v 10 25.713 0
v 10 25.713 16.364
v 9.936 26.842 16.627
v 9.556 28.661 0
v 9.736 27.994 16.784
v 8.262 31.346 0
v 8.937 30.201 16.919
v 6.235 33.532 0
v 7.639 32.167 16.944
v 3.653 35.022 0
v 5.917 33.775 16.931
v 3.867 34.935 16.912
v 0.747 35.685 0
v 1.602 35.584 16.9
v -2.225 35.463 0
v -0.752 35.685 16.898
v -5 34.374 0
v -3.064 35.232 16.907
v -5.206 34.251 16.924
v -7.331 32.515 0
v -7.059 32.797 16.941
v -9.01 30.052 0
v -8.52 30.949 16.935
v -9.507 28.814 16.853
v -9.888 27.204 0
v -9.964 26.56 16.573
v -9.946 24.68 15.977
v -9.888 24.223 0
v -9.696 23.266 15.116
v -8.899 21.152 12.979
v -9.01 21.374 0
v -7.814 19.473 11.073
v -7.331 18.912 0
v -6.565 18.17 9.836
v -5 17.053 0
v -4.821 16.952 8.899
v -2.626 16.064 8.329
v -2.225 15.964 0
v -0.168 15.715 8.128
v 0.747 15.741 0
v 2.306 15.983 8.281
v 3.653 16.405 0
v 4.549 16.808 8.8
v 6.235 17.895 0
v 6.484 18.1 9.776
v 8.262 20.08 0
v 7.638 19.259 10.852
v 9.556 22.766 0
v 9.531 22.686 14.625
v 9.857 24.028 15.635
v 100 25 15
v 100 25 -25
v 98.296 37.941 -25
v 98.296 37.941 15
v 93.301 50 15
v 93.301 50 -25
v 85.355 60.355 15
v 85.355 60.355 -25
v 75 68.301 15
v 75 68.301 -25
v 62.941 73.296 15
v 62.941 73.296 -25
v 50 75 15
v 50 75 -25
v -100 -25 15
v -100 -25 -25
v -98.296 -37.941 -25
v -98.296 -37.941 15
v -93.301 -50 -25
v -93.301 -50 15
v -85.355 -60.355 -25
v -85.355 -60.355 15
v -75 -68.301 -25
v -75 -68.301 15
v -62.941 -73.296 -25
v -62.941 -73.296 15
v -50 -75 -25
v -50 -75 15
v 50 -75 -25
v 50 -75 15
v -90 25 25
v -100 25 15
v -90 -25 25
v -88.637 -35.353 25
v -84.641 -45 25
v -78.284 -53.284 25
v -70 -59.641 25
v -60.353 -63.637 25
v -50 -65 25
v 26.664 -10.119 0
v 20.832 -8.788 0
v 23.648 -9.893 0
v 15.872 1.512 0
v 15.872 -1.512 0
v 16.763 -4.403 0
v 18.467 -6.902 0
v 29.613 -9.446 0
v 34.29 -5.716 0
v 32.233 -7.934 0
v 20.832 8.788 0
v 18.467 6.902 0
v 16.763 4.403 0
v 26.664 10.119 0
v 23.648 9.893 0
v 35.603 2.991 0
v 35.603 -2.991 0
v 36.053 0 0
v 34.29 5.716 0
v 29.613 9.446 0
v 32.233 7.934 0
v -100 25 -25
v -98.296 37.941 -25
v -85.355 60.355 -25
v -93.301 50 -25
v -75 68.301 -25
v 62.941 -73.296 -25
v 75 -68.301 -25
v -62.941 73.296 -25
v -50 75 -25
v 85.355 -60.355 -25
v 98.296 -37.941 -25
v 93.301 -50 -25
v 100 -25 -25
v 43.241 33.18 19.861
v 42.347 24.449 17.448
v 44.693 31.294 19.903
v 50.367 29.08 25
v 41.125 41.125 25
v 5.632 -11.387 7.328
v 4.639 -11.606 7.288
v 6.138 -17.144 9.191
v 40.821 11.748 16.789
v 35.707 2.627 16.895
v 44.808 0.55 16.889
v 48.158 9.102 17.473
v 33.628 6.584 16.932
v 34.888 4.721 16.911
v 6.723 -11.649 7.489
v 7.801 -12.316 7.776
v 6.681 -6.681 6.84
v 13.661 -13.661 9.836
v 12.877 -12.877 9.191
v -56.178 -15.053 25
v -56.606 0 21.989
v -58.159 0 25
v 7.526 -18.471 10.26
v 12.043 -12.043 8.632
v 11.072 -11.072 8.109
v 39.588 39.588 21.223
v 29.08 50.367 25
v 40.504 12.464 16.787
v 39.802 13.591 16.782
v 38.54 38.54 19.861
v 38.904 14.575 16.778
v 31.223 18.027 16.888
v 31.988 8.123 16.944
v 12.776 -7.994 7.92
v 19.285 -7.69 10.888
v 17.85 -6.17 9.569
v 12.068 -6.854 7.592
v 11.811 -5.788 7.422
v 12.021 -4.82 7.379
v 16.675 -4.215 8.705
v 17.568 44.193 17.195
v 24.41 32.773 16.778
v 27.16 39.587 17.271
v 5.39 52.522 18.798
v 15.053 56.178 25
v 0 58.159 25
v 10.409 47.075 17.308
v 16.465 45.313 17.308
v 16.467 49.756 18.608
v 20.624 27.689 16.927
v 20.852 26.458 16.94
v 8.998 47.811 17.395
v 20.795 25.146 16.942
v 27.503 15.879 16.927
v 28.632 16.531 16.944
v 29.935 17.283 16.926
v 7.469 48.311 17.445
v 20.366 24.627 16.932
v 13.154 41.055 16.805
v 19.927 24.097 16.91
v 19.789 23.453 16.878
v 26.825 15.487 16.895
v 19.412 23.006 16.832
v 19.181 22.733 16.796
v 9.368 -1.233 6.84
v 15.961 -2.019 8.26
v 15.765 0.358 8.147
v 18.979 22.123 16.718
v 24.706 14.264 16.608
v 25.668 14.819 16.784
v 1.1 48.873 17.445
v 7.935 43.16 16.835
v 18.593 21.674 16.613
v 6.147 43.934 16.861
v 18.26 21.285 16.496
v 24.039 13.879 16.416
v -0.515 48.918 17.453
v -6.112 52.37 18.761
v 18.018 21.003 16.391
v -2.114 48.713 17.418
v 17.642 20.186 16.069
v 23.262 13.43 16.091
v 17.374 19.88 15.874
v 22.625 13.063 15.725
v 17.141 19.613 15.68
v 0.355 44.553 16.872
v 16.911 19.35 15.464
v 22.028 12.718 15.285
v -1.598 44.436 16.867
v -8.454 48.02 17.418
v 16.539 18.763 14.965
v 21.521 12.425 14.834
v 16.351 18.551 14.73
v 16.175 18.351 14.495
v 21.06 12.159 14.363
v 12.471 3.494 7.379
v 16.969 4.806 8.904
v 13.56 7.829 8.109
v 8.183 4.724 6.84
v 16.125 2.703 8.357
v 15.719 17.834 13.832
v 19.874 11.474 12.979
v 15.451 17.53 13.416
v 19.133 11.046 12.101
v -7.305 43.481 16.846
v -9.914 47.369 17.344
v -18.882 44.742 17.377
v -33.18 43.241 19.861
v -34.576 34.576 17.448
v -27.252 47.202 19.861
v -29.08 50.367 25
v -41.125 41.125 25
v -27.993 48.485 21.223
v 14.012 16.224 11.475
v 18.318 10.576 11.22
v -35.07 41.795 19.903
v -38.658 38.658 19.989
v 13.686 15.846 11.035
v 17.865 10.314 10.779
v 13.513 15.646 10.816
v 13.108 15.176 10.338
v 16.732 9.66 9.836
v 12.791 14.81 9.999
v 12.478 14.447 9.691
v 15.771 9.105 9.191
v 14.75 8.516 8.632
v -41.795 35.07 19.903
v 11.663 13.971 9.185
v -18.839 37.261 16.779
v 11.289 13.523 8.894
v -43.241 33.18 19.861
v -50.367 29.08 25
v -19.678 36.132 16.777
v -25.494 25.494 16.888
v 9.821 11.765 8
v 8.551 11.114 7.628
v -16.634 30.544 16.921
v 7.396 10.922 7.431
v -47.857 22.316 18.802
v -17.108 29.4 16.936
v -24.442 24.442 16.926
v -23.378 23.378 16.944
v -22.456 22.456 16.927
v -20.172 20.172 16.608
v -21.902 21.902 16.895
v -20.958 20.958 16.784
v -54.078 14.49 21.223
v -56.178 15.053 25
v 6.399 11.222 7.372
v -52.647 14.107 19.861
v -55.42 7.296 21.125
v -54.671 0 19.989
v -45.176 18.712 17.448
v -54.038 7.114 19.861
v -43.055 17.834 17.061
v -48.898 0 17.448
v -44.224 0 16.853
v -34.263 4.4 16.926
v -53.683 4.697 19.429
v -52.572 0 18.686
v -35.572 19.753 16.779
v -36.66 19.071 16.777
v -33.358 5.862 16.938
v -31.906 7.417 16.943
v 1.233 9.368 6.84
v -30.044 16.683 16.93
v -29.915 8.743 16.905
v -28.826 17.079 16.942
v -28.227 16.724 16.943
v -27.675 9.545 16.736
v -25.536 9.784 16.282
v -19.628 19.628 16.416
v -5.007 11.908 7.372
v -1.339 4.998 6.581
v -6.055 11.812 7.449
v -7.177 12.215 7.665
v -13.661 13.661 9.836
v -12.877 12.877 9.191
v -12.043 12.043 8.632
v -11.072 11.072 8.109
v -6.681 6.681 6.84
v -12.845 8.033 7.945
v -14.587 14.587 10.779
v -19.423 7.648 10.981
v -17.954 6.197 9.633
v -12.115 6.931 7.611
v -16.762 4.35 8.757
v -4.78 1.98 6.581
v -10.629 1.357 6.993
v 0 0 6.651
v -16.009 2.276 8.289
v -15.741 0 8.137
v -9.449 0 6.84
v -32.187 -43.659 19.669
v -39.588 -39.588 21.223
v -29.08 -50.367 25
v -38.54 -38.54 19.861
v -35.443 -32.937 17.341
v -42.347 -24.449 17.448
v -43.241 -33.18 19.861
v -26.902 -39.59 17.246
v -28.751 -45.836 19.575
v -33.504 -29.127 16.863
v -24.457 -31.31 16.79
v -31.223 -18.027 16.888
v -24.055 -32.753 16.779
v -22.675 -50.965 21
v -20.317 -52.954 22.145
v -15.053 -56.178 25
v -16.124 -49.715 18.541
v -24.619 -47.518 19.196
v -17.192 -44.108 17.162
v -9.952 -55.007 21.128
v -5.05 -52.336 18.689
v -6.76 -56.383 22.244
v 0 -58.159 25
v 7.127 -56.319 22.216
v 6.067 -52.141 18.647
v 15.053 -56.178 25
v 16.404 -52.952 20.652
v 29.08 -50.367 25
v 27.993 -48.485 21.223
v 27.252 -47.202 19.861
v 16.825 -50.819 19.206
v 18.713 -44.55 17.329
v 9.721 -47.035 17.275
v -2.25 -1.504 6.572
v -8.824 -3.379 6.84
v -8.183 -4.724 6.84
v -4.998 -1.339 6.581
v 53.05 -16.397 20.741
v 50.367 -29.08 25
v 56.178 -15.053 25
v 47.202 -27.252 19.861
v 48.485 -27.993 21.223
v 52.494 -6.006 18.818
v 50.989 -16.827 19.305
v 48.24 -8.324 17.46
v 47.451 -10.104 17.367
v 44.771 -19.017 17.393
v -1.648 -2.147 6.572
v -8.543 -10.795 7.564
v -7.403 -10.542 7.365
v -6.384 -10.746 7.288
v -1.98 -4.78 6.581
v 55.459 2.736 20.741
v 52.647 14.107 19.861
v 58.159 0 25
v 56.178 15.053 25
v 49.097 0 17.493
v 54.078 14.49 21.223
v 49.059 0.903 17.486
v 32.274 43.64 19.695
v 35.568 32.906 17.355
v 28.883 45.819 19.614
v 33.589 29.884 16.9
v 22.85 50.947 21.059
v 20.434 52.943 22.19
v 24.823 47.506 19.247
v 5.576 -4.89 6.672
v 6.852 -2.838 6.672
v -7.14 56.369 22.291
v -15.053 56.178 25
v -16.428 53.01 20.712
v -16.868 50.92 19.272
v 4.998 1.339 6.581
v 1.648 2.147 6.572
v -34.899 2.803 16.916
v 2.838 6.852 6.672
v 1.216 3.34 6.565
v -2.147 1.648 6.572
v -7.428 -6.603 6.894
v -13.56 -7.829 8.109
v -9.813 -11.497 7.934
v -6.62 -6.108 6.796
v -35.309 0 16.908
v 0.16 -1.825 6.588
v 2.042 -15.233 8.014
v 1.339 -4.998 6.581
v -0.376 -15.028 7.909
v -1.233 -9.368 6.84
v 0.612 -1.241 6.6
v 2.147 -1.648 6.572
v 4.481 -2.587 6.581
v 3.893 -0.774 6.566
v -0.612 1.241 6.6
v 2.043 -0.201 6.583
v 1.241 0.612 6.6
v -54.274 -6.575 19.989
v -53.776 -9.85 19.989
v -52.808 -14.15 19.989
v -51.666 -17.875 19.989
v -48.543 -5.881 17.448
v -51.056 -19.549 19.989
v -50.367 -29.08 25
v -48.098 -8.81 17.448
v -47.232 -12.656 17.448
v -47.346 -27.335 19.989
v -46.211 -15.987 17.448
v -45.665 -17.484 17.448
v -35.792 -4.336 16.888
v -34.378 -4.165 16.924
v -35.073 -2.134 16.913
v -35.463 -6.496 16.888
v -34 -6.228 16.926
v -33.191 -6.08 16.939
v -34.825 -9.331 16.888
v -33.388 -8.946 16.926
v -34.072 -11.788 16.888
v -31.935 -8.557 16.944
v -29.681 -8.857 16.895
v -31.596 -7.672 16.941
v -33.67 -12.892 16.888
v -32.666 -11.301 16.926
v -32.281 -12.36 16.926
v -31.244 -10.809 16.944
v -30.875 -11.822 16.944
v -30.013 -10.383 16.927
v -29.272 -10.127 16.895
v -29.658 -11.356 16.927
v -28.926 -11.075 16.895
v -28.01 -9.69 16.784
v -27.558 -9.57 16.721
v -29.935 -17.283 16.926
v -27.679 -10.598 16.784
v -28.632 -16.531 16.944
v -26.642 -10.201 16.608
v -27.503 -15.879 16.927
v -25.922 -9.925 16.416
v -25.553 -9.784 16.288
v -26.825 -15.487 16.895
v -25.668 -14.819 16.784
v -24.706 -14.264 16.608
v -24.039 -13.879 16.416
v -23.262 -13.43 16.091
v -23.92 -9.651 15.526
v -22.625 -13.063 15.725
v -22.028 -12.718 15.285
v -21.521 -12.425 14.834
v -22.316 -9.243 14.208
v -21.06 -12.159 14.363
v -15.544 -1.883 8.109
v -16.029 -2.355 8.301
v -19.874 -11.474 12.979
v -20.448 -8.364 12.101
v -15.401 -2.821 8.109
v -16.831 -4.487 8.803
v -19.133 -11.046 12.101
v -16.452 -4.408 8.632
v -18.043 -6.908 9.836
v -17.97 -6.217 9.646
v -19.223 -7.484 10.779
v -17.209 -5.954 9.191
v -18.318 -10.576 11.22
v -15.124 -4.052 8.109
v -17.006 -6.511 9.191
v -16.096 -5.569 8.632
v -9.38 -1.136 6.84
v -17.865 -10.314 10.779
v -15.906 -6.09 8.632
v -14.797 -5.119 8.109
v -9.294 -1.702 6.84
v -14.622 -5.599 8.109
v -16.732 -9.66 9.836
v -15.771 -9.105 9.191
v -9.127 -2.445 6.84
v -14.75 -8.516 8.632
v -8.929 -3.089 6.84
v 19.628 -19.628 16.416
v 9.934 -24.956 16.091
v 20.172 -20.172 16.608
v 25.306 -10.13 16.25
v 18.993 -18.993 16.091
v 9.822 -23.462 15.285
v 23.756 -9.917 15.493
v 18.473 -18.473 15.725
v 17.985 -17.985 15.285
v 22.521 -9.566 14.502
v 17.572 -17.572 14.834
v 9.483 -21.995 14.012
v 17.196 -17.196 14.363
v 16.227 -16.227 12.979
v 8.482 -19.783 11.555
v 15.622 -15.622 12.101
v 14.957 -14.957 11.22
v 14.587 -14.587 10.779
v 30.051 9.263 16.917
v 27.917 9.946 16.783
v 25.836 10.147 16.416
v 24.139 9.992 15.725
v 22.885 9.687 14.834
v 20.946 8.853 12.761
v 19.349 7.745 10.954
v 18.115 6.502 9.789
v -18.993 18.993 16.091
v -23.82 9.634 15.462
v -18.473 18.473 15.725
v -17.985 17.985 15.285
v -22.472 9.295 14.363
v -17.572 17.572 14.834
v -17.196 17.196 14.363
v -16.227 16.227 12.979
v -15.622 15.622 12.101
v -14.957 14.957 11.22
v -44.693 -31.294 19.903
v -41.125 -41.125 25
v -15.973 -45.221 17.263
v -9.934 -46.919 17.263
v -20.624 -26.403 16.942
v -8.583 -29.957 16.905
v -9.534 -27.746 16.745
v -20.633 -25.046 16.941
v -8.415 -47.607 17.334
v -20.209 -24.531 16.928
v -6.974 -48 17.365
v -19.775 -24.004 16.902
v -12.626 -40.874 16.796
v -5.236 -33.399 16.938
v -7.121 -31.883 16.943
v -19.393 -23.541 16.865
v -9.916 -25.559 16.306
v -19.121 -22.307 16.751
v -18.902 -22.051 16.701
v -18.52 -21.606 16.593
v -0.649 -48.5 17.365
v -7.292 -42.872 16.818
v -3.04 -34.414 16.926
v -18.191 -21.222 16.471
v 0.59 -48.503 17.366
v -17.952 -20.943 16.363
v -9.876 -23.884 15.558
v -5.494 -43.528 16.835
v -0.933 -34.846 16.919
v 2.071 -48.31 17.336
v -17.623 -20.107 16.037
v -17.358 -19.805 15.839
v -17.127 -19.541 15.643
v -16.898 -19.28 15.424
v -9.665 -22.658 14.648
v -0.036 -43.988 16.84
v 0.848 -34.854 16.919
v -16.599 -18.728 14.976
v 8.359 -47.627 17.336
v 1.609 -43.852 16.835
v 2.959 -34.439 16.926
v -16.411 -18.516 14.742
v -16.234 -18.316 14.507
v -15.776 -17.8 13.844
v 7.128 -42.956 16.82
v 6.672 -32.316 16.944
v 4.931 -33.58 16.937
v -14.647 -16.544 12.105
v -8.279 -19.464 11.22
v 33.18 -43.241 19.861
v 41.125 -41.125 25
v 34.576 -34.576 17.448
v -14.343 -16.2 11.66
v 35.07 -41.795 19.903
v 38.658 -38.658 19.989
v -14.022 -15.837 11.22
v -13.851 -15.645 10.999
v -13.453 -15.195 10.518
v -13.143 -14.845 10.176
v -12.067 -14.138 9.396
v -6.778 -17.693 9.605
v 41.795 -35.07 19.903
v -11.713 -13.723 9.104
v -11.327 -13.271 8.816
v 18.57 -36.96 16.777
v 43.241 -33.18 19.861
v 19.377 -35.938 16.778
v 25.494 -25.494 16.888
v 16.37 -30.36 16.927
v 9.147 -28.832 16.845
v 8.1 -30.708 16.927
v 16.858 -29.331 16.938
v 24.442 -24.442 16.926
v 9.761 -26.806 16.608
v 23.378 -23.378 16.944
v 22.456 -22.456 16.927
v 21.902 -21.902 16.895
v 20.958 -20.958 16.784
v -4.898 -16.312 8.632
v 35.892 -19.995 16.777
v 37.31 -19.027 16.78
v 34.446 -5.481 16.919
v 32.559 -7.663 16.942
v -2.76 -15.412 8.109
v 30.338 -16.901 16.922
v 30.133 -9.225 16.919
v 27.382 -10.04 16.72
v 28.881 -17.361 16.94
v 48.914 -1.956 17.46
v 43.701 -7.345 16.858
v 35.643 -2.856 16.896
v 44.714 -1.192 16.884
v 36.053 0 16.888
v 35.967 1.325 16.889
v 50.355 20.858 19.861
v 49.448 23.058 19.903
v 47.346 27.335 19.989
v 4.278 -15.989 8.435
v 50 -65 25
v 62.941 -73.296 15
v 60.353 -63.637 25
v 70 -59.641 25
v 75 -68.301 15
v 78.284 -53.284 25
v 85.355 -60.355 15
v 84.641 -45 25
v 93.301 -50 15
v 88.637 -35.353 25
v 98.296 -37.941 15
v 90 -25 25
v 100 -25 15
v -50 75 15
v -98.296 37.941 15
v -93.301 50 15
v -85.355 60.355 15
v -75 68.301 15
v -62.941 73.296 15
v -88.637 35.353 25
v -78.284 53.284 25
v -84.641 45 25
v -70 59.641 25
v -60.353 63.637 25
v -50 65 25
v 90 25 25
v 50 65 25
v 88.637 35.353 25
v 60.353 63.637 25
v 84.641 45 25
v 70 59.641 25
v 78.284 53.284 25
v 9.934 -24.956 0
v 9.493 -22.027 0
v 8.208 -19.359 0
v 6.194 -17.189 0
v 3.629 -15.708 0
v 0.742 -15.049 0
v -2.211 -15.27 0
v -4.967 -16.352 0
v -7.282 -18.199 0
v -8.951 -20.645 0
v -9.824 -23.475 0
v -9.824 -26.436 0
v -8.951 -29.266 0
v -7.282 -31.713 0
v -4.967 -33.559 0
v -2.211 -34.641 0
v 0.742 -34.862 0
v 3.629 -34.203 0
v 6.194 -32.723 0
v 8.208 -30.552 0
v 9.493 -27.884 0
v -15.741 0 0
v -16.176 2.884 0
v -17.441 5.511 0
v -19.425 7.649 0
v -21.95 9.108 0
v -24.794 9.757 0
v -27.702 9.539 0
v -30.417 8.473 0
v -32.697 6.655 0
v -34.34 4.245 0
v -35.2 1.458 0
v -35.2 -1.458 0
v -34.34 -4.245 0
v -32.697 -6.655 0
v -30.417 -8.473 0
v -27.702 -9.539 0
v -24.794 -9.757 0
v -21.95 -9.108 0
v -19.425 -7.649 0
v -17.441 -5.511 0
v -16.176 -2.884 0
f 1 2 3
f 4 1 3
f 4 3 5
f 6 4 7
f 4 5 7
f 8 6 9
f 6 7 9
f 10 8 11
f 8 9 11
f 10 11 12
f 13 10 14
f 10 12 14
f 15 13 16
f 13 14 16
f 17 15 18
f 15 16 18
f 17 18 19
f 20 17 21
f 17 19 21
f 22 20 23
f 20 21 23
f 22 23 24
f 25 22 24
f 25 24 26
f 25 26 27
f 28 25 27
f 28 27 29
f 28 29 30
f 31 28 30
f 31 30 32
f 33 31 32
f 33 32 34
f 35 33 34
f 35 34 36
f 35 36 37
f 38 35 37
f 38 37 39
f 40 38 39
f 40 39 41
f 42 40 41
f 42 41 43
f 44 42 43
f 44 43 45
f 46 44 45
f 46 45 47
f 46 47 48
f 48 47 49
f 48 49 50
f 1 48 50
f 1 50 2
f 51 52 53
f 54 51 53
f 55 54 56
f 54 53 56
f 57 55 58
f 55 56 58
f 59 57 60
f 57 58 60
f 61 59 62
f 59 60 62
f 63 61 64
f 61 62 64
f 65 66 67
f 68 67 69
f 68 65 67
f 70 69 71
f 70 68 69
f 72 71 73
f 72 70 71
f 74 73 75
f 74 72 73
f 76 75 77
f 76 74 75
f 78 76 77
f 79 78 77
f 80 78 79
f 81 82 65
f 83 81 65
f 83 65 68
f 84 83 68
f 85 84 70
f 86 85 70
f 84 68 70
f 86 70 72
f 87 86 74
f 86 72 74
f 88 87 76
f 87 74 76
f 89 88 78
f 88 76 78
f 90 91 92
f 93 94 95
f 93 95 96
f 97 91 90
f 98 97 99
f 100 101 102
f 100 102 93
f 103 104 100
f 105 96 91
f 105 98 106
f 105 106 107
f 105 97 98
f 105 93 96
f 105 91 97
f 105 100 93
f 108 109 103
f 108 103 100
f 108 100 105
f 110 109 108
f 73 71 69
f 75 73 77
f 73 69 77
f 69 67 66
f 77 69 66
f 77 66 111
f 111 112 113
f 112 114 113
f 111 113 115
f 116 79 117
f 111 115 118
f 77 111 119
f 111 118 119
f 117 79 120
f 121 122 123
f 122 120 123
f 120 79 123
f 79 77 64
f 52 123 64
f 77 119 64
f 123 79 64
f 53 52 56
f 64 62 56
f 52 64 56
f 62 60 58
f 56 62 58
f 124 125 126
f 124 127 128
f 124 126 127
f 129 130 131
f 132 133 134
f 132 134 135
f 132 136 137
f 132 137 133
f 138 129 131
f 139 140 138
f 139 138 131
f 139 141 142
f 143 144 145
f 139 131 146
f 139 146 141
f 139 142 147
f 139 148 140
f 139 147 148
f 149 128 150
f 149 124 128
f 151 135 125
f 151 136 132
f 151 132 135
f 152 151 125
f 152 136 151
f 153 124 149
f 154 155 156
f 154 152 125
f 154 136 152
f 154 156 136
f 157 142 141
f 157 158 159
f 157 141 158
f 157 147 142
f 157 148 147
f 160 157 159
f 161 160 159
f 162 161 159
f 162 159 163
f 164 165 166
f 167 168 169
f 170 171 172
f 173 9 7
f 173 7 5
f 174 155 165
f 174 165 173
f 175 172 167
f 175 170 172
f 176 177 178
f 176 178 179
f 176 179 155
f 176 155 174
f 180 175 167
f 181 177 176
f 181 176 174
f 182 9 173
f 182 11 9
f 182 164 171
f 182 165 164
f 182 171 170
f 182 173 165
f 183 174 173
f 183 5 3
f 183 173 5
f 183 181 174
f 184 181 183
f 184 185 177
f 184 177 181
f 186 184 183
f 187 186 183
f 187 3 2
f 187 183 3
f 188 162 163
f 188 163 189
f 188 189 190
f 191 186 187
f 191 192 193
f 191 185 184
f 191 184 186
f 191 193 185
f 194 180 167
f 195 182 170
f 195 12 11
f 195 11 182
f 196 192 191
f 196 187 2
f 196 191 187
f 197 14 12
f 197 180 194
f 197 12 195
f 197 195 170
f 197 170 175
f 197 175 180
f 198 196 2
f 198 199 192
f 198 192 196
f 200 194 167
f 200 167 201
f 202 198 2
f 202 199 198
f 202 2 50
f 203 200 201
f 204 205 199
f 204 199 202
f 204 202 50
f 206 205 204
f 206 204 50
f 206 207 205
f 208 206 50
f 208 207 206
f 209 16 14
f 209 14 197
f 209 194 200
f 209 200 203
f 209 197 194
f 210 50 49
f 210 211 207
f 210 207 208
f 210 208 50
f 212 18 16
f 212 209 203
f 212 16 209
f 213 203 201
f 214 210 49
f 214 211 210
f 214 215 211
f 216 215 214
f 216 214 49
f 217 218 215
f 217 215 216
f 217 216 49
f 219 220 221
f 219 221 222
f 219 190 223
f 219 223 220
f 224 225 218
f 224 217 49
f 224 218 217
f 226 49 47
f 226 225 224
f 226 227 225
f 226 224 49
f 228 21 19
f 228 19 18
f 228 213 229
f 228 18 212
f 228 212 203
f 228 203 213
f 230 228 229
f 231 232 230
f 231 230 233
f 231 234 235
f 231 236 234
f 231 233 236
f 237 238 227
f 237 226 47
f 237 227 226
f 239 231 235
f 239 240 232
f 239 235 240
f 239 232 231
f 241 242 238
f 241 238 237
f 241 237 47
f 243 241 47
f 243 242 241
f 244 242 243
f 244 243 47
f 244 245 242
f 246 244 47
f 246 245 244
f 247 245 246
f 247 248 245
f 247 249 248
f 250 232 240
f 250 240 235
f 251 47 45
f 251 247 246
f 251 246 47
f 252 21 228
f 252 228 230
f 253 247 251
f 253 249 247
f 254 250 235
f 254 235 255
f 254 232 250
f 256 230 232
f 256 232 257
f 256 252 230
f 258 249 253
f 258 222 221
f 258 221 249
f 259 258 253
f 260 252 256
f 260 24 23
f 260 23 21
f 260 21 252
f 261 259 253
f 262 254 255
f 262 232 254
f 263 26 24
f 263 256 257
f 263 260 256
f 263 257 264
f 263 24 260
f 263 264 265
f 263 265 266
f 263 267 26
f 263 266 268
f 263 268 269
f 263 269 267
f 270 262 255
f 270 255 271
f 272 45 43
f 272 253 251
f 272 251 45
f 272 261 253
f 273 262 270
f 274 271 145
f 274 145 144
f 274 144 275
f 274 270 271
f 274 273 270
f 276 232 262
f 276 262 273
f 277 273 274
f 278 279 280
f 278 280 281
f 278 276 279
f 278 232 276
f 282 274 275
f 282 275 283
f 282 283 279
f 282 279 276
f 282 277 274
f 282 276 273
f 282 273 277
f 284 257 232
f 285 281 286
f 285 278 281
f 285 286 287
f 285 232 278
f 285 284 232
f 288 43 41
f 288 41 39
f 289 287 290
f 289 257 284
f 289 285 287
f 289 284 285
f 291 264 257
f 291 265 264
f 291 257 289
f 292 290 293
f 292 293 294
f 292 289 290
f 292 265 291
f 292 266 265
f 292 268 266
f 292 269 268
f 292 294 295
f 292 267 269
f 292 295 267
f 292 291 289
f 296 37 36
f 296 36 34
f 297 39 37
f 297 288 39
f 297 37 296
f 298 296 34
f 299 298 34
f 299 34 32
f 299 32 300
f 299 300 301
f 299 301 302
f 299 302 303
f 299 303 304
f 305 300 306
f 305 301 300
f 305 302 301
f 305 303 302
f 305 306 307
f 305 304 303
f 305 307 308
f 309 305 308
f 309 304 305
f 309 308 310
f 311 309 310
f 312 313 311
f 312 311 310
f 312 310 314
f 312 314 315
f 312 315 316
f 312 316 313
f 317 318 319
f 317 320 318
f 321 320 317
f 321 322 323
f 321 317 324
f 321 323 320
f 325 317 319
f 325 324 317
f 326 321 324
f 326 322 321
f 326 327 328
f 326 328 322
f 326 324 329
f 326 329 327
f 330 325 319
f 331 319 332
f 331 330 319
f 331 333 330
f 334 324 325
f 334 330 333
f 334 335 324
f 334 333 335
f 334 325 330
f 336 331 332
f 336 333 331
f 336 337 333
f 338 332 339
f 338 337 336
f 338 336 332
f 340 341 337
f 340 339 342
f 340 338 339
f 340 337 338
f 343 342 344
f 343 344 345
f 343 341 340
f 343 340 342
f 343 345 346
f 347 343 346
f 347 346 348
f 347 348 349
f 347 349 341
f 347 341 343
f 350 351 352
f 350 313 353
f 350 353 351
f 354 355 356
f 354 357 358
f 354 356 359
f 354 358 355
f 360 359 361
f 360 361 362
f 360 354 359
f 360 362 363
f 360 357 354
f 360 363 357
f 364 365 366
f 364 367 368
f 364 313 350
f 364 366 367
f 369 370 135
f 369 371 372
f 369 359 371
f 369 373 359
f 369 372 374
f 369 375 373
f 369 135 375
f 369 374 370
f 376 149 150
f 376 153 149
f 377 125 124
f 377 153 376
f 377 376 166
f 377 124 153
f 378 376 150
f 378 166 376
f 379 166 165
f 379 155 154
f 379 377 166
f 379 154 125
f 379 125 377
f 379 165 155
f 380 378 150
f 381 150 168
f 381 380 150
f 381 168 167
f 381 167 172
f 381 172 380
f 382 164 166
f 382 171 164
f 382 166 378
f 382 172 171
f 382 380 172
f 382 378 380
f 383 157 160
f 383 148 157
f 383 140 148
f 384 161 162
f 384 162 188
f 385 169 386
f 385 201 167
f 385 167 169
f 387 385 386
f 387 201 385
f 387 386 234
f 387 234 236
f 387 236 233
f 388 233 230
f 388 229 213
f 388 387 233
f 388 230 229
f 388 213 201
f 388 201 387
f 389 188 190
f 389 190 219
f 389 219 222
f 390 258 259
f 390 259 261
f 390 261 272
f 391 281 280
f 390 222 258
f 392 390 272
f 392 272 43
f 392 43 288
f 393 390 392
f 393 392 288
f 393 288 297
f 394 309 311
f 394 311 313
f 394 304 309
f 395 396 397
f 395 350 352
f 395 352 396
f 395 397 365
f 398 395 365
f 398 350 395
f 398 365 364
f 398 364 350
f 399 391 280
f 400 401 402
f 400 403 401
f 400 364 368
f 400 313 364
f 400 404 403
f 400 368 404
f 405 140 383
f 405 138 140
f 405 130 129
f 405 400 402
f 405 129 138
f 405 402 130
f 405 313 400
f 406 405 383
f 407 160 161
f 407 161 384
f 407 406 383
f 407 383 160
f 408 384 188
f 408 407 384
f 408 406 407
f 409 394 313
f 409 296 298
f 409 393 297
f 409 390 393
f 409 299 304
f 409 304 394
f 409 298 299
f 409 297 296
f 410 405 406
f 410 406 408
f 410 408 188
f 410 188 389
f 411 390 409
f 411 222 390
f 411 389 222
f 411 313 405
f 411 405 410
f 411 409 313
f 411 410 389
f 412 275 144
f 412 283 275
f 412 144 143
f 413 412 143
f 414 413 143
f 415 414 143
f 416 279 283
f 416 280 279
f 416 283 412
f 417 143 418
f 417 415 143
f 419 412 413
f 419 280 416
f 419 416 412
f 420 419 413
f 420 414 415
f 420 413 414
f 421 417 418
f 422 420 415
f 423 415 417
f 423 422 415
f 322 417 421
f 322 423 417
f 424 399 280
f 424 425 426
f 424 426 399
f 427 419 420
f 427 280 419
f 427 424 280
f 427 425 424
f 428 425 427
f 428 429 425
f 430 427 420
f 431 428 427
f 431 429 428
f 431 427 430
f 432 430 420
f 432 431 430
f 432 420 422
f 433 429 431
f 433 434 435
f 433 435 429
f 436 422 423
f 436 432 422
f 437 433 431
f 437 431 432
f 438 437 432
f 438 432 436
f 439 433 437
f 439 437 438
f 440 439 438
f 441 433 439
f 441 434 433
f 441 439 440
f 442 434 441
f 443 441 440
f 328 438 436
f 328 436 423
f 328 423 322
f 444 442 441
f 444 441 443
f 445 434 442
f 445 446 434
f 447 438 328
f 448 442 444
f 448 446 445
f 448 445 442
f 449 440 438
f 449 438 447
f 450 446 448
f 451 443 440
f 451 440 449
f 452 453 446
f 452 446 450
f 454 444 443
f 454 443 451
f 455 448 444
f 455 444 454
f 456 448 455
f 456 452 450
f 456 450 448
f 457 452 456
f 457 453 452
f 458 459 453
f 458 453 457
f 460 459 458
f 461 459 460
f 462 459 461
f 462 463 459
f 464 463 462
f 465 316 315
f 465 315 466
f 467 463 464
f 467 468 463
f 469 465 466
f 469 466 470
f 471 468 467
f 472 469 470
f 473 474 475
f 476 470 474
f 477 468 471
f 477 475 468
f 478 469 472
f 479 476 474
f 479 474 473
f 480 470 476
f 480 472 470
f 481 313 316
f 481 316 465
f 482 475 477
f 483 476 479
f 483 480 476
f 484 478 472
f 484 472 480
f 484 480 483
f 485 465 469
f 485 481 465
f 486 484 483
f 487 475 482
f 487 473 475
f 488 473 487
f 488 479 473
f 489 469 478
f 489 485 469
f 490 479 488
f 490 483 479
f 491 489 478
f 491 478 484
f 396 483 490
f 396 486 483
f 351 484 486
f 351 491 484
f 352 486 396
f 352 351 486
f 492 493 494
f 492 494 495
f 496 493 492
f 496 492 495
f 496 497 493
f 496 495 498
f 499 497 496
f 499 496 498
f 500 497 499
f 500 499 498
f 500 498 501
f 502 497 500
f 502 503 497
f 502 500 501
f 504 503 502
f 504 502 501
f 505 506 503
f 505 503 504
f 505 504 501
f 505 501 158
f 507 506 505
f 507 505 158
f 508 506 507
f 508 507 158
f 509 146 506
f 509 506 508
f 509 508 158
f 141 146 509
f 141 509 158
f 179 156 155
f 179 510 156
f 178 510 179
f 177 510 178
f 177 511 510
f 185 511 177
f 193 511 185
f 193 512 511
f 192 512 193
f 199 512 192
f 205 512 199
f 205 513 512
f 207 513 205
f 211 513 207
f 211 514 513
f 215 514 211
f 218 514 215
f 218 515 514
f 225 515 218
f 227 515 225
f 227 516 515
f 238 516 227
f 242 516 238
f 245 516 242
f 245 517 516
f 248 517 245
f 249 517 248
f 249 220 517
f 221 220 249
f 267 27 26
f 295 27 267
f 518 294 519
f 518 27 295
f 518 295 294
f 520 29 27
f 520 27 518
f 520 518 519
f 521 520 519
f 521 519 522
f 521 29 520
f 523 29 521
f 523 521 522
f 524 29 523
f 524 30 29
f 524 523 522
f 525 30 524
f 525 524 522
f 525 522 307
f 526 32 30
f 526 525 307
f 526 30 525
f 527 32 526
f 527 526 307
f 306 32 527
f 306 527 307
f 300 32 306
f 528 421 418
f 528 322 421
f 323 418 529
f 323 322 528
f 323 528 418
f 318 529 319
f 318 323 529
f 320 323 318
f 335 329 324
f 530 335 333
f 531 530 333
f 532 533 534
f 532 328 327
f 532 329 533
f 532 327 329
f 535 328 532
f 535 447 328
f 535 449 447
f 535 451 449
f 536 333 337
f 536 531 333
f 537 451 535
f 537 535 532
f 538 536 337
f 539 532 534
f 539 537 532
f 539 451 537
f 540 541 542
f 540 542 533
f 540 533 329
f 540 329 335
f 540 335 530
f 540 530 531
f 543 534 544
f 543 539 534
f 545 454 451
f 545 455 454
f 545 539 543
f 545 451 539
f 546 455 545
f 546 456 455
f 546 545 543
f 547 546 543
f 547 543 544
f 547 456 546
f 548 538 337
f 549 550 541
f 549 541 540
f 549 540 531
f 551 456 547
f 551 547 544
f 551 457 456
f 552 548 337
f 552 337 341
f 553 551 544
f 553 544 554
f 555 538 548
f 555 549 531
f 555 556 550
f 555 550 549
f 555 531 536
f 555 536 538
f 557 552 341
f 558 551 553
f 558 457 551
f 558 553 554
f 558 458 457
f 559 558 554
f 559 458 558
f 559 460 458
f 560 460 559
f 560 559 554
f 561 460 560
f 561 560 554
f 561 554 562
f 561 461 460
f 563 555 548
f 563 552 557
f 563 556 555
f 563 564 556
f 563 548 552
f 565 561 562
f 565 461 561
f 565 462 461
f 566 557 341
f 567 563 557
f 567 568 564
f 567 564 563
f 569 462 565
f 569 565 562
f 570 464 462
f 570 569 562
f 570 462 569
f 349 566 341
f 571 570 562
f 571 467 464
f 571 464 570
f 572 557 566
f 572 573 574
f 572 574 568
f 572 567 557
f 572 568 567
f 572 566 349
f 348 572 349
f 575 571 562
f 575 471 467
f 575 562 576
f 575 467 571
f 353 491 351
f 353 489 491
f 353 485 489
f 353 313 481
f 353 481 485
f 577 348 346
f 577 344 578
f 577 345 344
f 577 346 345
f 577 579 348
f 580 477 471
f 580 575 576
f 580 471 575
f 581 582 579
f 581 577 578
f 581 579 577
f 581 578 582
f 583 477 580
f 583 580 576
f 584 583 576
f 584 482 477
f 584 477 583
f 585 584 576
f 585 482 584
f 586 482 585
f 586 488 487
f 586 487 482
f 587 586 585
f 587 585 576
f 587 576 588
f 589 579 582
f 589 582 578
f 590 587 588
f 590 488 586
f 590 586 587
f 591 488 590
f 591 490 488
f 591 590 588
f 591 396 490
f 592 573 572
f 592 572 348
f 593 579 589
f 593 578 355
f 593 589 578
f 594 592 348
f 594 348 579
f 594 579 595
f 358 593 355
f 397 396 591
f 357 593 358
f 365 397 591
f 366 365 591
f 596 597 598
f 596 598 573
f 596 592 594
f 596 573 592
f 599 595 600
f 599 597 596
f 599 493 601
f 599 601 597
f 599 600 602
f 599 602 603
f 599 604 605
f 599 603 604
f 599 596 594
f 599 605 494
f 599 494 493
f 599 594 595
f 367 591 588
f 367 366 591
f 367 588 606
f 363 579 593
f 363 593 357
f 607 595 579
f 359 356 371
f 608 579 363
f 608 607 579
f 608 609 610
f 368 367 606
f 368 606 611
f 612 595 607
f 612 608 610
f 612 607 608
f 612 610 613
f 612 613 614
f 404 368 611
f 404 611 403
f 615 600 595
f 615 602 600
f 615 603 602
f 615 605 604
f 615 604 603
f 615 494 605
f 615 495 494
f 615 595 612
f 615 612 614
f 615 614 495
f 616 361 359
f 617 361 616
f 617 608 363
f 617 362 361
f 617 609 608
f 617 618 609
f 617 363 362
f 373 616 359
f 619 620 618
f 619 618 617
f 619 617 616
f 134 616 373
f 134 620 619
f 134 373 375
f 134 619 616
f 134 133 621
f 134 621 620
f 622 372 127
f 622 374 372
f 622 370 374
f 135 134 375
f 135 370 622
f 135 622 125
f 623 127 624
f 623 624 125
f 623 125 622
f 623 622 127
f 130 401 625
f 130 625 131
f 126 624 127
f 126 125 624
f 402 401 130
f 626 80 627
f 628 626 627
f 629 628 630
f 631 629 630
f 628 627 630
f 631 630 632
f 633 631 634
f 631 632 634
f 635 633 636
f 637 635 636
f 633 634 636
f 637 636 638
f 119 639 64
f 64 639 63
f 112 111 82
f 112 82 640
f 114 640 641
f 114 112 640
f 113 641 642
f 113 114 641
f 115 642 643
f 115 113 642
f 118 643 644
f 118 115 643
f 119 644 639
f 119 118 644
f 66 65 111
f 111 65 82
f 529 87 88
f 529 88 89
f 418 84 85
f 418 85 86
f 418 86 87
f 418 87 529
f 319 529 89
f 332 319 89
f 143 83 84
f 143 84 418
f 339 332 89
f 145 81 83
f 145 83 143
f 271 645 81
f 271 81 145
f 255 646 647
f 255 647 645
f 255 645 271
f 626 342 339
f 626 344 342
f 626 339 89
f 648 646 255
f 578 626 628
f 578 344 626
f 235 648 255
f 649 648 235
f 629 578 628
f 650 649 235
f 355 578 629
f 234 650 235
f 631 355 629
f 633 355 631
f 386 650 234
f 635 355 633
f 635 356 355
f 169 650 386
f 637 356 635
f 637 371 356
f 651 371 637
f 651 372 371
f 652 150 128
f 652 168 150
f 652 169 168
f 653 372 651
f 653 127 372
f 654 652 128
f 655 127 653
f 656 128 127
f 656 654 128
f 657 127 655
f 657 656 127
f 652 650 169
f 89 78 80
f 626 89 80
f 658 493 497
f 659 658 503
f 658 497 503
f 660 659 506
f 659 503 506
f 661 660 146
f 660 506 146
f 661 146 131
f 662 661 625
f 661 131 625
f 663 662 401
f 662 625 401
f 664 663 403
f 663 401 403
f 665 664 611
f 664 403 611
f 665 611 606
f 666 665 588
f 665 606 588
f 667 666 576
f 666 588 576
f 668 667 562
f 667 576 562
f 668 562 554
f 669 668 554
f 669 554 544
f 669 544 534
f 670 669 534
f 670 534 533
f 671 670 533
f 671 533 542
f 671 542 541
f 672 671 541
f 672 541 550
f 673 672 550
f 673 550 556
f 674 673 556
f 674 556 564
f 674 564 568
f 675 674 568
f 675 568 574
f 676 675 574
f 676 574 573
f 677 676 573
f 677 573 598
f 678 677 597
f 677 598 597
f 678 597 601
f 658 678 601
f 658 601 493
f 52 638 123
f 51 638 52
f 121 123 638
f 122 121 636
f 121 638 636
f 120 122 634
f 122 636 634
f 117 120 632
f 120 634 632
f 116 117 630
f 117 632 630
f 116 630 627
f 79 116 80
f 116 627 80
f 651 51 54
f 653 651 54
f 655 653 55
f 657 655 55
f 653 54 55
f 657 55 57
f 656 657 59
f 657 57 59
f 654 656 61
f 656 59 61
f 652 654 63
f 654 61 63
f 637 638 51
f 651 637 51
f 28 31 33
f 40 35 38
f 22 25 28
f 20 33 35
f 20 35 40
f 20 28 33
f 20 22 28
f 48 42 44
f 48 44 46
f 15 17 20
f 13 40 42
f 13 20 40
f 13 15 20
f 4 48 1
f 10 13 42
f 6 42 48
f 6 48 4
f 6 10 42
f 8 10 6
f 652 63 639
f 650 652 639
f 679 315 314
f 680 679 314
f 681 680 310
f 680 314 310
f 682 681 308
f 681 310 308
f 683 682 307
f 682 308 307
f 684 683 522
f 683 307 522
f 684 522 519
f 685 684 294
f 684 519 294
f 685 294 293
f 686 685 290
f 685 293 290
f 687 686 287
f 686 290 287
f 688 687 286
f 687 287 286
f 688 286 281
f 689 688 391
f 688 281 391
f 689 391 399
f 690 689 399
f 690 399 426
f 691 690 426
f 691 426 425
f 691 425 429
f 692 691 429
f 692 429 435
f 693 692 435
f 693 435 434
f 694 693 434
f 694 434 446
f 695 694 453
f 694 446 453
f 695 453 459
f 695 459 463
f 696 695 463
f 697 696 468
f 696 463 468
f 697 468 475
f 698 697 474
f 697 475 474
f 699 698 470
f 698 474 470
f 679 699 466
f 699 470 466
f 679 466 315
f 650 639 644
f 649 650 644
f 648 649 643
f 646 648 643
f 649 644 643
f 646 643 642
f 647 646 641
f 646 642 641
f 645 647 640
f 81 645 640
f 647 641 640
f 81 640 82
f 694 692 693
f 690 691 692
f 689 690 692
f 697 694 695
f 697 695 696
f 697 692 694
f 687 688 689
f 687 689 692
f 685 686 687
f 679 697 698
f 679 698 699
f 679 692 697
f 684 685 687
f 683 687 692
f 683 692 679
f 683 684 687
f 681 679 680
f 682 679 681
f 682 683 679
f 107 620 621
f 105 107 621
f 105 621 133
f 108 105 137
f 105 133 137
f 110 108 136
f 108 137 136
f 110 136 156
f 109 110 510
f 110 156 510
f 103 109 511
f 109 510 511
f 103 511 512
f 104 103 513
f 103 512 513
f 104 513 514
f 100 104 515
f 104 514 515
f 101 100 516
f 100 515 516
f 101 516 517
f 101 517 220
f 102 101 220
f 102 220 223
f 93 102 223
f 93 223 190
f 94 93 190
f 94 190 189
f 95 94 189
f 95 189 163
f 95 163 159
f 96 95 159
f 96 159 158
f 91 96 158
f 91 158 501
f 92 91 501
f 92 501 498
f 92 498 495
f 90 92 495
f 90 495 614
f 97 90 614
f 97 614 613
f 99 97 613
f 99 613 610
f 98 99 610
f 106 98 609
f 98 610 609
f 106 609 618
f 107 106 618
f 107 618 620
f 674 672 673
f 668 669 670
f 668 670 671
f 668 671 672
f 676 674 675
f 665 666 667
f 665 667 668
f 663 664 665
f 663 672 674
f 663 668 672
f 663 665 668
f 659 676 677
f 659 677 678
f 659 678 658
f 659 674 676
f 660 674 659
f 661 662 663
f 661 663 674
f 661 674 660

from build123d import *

# Parameters (mm, degrees)
F0_W     = 200
F0_H     = 150
F1_DEPTH = 25
F2_R     = 50
F5_SIZE  = 10
F6_R     = 9.7838698058
F6_R_2   = 10
F6_R_3   = 10.147546669
F6_R_4   = 9.9344737349
F7_DEPTH = 25


with BuildPart() as f1:
    # F0 (on Top) → F1 (new body, symmetric)
    with BuildSketch(Plane.XY):
        Rectangle(F0_W, F0_H)
    extrude(amount=F1_DEPTH, both=True)

    # F2
    f2_edges = [f1.edges().sort_by_distance(p)[0] for p in [
        (-100, -75, 0),
        (100, -75, 0),
        (100, 75, 0),
        (-100, 75, 0),
    ]]
    fillet(f2_edges, radius=F2_R)

    # F3 (on Front) → F4 (revolve, cut)
    with BuildSketch(Plane.XZ):
        with BuildLine():
            Line((0, 25), (-58.1593476236, 25))
            add(Edge.make_bspline(
                [(-58.1593476236, 25), (-53.9096311875, 12.7192745819), (-17.6634682668, 23.9500074163), (-23.8563775859, 5.5907417856), (0, 6.6510247998)],
                knots=[0, 0, 0, 0, 0.5060175337, 1, 1, 1, 1], degree=3))
            Line((0, 6.6510247998), (0, 25))
        make_face()
    revolve(axis=Axis((0, 0, 15.8255123999), (0, 0, 1)), mode=Mode.SUBTRACT)

    # F5
    f5_edges = [f1.edges().sort_by_distance(p)[0] for p in [
        (0, -75, 25),
    ]]
    chamfer(f5_edges, length=F5_SIZE)

    # F6 (on face) → F7 (cut)
    with BuildSketch(Plane.XY.offset(25)):
        with Locations((-25.5249421373, 0)):
            Circle(F6_R)
        with Locations((0, 25.7132698898)):
            Circle(F6_R_2)
        with Locations((25.905932002, 0)):
            Circle(F6_R_3)
        with Locations((0, -24.9556606683)):
            Circle(F6_R_4)
    extrude(amount=-F7_DEPTH, mode=Mode.SUBTRACT)


solid = f1.part
